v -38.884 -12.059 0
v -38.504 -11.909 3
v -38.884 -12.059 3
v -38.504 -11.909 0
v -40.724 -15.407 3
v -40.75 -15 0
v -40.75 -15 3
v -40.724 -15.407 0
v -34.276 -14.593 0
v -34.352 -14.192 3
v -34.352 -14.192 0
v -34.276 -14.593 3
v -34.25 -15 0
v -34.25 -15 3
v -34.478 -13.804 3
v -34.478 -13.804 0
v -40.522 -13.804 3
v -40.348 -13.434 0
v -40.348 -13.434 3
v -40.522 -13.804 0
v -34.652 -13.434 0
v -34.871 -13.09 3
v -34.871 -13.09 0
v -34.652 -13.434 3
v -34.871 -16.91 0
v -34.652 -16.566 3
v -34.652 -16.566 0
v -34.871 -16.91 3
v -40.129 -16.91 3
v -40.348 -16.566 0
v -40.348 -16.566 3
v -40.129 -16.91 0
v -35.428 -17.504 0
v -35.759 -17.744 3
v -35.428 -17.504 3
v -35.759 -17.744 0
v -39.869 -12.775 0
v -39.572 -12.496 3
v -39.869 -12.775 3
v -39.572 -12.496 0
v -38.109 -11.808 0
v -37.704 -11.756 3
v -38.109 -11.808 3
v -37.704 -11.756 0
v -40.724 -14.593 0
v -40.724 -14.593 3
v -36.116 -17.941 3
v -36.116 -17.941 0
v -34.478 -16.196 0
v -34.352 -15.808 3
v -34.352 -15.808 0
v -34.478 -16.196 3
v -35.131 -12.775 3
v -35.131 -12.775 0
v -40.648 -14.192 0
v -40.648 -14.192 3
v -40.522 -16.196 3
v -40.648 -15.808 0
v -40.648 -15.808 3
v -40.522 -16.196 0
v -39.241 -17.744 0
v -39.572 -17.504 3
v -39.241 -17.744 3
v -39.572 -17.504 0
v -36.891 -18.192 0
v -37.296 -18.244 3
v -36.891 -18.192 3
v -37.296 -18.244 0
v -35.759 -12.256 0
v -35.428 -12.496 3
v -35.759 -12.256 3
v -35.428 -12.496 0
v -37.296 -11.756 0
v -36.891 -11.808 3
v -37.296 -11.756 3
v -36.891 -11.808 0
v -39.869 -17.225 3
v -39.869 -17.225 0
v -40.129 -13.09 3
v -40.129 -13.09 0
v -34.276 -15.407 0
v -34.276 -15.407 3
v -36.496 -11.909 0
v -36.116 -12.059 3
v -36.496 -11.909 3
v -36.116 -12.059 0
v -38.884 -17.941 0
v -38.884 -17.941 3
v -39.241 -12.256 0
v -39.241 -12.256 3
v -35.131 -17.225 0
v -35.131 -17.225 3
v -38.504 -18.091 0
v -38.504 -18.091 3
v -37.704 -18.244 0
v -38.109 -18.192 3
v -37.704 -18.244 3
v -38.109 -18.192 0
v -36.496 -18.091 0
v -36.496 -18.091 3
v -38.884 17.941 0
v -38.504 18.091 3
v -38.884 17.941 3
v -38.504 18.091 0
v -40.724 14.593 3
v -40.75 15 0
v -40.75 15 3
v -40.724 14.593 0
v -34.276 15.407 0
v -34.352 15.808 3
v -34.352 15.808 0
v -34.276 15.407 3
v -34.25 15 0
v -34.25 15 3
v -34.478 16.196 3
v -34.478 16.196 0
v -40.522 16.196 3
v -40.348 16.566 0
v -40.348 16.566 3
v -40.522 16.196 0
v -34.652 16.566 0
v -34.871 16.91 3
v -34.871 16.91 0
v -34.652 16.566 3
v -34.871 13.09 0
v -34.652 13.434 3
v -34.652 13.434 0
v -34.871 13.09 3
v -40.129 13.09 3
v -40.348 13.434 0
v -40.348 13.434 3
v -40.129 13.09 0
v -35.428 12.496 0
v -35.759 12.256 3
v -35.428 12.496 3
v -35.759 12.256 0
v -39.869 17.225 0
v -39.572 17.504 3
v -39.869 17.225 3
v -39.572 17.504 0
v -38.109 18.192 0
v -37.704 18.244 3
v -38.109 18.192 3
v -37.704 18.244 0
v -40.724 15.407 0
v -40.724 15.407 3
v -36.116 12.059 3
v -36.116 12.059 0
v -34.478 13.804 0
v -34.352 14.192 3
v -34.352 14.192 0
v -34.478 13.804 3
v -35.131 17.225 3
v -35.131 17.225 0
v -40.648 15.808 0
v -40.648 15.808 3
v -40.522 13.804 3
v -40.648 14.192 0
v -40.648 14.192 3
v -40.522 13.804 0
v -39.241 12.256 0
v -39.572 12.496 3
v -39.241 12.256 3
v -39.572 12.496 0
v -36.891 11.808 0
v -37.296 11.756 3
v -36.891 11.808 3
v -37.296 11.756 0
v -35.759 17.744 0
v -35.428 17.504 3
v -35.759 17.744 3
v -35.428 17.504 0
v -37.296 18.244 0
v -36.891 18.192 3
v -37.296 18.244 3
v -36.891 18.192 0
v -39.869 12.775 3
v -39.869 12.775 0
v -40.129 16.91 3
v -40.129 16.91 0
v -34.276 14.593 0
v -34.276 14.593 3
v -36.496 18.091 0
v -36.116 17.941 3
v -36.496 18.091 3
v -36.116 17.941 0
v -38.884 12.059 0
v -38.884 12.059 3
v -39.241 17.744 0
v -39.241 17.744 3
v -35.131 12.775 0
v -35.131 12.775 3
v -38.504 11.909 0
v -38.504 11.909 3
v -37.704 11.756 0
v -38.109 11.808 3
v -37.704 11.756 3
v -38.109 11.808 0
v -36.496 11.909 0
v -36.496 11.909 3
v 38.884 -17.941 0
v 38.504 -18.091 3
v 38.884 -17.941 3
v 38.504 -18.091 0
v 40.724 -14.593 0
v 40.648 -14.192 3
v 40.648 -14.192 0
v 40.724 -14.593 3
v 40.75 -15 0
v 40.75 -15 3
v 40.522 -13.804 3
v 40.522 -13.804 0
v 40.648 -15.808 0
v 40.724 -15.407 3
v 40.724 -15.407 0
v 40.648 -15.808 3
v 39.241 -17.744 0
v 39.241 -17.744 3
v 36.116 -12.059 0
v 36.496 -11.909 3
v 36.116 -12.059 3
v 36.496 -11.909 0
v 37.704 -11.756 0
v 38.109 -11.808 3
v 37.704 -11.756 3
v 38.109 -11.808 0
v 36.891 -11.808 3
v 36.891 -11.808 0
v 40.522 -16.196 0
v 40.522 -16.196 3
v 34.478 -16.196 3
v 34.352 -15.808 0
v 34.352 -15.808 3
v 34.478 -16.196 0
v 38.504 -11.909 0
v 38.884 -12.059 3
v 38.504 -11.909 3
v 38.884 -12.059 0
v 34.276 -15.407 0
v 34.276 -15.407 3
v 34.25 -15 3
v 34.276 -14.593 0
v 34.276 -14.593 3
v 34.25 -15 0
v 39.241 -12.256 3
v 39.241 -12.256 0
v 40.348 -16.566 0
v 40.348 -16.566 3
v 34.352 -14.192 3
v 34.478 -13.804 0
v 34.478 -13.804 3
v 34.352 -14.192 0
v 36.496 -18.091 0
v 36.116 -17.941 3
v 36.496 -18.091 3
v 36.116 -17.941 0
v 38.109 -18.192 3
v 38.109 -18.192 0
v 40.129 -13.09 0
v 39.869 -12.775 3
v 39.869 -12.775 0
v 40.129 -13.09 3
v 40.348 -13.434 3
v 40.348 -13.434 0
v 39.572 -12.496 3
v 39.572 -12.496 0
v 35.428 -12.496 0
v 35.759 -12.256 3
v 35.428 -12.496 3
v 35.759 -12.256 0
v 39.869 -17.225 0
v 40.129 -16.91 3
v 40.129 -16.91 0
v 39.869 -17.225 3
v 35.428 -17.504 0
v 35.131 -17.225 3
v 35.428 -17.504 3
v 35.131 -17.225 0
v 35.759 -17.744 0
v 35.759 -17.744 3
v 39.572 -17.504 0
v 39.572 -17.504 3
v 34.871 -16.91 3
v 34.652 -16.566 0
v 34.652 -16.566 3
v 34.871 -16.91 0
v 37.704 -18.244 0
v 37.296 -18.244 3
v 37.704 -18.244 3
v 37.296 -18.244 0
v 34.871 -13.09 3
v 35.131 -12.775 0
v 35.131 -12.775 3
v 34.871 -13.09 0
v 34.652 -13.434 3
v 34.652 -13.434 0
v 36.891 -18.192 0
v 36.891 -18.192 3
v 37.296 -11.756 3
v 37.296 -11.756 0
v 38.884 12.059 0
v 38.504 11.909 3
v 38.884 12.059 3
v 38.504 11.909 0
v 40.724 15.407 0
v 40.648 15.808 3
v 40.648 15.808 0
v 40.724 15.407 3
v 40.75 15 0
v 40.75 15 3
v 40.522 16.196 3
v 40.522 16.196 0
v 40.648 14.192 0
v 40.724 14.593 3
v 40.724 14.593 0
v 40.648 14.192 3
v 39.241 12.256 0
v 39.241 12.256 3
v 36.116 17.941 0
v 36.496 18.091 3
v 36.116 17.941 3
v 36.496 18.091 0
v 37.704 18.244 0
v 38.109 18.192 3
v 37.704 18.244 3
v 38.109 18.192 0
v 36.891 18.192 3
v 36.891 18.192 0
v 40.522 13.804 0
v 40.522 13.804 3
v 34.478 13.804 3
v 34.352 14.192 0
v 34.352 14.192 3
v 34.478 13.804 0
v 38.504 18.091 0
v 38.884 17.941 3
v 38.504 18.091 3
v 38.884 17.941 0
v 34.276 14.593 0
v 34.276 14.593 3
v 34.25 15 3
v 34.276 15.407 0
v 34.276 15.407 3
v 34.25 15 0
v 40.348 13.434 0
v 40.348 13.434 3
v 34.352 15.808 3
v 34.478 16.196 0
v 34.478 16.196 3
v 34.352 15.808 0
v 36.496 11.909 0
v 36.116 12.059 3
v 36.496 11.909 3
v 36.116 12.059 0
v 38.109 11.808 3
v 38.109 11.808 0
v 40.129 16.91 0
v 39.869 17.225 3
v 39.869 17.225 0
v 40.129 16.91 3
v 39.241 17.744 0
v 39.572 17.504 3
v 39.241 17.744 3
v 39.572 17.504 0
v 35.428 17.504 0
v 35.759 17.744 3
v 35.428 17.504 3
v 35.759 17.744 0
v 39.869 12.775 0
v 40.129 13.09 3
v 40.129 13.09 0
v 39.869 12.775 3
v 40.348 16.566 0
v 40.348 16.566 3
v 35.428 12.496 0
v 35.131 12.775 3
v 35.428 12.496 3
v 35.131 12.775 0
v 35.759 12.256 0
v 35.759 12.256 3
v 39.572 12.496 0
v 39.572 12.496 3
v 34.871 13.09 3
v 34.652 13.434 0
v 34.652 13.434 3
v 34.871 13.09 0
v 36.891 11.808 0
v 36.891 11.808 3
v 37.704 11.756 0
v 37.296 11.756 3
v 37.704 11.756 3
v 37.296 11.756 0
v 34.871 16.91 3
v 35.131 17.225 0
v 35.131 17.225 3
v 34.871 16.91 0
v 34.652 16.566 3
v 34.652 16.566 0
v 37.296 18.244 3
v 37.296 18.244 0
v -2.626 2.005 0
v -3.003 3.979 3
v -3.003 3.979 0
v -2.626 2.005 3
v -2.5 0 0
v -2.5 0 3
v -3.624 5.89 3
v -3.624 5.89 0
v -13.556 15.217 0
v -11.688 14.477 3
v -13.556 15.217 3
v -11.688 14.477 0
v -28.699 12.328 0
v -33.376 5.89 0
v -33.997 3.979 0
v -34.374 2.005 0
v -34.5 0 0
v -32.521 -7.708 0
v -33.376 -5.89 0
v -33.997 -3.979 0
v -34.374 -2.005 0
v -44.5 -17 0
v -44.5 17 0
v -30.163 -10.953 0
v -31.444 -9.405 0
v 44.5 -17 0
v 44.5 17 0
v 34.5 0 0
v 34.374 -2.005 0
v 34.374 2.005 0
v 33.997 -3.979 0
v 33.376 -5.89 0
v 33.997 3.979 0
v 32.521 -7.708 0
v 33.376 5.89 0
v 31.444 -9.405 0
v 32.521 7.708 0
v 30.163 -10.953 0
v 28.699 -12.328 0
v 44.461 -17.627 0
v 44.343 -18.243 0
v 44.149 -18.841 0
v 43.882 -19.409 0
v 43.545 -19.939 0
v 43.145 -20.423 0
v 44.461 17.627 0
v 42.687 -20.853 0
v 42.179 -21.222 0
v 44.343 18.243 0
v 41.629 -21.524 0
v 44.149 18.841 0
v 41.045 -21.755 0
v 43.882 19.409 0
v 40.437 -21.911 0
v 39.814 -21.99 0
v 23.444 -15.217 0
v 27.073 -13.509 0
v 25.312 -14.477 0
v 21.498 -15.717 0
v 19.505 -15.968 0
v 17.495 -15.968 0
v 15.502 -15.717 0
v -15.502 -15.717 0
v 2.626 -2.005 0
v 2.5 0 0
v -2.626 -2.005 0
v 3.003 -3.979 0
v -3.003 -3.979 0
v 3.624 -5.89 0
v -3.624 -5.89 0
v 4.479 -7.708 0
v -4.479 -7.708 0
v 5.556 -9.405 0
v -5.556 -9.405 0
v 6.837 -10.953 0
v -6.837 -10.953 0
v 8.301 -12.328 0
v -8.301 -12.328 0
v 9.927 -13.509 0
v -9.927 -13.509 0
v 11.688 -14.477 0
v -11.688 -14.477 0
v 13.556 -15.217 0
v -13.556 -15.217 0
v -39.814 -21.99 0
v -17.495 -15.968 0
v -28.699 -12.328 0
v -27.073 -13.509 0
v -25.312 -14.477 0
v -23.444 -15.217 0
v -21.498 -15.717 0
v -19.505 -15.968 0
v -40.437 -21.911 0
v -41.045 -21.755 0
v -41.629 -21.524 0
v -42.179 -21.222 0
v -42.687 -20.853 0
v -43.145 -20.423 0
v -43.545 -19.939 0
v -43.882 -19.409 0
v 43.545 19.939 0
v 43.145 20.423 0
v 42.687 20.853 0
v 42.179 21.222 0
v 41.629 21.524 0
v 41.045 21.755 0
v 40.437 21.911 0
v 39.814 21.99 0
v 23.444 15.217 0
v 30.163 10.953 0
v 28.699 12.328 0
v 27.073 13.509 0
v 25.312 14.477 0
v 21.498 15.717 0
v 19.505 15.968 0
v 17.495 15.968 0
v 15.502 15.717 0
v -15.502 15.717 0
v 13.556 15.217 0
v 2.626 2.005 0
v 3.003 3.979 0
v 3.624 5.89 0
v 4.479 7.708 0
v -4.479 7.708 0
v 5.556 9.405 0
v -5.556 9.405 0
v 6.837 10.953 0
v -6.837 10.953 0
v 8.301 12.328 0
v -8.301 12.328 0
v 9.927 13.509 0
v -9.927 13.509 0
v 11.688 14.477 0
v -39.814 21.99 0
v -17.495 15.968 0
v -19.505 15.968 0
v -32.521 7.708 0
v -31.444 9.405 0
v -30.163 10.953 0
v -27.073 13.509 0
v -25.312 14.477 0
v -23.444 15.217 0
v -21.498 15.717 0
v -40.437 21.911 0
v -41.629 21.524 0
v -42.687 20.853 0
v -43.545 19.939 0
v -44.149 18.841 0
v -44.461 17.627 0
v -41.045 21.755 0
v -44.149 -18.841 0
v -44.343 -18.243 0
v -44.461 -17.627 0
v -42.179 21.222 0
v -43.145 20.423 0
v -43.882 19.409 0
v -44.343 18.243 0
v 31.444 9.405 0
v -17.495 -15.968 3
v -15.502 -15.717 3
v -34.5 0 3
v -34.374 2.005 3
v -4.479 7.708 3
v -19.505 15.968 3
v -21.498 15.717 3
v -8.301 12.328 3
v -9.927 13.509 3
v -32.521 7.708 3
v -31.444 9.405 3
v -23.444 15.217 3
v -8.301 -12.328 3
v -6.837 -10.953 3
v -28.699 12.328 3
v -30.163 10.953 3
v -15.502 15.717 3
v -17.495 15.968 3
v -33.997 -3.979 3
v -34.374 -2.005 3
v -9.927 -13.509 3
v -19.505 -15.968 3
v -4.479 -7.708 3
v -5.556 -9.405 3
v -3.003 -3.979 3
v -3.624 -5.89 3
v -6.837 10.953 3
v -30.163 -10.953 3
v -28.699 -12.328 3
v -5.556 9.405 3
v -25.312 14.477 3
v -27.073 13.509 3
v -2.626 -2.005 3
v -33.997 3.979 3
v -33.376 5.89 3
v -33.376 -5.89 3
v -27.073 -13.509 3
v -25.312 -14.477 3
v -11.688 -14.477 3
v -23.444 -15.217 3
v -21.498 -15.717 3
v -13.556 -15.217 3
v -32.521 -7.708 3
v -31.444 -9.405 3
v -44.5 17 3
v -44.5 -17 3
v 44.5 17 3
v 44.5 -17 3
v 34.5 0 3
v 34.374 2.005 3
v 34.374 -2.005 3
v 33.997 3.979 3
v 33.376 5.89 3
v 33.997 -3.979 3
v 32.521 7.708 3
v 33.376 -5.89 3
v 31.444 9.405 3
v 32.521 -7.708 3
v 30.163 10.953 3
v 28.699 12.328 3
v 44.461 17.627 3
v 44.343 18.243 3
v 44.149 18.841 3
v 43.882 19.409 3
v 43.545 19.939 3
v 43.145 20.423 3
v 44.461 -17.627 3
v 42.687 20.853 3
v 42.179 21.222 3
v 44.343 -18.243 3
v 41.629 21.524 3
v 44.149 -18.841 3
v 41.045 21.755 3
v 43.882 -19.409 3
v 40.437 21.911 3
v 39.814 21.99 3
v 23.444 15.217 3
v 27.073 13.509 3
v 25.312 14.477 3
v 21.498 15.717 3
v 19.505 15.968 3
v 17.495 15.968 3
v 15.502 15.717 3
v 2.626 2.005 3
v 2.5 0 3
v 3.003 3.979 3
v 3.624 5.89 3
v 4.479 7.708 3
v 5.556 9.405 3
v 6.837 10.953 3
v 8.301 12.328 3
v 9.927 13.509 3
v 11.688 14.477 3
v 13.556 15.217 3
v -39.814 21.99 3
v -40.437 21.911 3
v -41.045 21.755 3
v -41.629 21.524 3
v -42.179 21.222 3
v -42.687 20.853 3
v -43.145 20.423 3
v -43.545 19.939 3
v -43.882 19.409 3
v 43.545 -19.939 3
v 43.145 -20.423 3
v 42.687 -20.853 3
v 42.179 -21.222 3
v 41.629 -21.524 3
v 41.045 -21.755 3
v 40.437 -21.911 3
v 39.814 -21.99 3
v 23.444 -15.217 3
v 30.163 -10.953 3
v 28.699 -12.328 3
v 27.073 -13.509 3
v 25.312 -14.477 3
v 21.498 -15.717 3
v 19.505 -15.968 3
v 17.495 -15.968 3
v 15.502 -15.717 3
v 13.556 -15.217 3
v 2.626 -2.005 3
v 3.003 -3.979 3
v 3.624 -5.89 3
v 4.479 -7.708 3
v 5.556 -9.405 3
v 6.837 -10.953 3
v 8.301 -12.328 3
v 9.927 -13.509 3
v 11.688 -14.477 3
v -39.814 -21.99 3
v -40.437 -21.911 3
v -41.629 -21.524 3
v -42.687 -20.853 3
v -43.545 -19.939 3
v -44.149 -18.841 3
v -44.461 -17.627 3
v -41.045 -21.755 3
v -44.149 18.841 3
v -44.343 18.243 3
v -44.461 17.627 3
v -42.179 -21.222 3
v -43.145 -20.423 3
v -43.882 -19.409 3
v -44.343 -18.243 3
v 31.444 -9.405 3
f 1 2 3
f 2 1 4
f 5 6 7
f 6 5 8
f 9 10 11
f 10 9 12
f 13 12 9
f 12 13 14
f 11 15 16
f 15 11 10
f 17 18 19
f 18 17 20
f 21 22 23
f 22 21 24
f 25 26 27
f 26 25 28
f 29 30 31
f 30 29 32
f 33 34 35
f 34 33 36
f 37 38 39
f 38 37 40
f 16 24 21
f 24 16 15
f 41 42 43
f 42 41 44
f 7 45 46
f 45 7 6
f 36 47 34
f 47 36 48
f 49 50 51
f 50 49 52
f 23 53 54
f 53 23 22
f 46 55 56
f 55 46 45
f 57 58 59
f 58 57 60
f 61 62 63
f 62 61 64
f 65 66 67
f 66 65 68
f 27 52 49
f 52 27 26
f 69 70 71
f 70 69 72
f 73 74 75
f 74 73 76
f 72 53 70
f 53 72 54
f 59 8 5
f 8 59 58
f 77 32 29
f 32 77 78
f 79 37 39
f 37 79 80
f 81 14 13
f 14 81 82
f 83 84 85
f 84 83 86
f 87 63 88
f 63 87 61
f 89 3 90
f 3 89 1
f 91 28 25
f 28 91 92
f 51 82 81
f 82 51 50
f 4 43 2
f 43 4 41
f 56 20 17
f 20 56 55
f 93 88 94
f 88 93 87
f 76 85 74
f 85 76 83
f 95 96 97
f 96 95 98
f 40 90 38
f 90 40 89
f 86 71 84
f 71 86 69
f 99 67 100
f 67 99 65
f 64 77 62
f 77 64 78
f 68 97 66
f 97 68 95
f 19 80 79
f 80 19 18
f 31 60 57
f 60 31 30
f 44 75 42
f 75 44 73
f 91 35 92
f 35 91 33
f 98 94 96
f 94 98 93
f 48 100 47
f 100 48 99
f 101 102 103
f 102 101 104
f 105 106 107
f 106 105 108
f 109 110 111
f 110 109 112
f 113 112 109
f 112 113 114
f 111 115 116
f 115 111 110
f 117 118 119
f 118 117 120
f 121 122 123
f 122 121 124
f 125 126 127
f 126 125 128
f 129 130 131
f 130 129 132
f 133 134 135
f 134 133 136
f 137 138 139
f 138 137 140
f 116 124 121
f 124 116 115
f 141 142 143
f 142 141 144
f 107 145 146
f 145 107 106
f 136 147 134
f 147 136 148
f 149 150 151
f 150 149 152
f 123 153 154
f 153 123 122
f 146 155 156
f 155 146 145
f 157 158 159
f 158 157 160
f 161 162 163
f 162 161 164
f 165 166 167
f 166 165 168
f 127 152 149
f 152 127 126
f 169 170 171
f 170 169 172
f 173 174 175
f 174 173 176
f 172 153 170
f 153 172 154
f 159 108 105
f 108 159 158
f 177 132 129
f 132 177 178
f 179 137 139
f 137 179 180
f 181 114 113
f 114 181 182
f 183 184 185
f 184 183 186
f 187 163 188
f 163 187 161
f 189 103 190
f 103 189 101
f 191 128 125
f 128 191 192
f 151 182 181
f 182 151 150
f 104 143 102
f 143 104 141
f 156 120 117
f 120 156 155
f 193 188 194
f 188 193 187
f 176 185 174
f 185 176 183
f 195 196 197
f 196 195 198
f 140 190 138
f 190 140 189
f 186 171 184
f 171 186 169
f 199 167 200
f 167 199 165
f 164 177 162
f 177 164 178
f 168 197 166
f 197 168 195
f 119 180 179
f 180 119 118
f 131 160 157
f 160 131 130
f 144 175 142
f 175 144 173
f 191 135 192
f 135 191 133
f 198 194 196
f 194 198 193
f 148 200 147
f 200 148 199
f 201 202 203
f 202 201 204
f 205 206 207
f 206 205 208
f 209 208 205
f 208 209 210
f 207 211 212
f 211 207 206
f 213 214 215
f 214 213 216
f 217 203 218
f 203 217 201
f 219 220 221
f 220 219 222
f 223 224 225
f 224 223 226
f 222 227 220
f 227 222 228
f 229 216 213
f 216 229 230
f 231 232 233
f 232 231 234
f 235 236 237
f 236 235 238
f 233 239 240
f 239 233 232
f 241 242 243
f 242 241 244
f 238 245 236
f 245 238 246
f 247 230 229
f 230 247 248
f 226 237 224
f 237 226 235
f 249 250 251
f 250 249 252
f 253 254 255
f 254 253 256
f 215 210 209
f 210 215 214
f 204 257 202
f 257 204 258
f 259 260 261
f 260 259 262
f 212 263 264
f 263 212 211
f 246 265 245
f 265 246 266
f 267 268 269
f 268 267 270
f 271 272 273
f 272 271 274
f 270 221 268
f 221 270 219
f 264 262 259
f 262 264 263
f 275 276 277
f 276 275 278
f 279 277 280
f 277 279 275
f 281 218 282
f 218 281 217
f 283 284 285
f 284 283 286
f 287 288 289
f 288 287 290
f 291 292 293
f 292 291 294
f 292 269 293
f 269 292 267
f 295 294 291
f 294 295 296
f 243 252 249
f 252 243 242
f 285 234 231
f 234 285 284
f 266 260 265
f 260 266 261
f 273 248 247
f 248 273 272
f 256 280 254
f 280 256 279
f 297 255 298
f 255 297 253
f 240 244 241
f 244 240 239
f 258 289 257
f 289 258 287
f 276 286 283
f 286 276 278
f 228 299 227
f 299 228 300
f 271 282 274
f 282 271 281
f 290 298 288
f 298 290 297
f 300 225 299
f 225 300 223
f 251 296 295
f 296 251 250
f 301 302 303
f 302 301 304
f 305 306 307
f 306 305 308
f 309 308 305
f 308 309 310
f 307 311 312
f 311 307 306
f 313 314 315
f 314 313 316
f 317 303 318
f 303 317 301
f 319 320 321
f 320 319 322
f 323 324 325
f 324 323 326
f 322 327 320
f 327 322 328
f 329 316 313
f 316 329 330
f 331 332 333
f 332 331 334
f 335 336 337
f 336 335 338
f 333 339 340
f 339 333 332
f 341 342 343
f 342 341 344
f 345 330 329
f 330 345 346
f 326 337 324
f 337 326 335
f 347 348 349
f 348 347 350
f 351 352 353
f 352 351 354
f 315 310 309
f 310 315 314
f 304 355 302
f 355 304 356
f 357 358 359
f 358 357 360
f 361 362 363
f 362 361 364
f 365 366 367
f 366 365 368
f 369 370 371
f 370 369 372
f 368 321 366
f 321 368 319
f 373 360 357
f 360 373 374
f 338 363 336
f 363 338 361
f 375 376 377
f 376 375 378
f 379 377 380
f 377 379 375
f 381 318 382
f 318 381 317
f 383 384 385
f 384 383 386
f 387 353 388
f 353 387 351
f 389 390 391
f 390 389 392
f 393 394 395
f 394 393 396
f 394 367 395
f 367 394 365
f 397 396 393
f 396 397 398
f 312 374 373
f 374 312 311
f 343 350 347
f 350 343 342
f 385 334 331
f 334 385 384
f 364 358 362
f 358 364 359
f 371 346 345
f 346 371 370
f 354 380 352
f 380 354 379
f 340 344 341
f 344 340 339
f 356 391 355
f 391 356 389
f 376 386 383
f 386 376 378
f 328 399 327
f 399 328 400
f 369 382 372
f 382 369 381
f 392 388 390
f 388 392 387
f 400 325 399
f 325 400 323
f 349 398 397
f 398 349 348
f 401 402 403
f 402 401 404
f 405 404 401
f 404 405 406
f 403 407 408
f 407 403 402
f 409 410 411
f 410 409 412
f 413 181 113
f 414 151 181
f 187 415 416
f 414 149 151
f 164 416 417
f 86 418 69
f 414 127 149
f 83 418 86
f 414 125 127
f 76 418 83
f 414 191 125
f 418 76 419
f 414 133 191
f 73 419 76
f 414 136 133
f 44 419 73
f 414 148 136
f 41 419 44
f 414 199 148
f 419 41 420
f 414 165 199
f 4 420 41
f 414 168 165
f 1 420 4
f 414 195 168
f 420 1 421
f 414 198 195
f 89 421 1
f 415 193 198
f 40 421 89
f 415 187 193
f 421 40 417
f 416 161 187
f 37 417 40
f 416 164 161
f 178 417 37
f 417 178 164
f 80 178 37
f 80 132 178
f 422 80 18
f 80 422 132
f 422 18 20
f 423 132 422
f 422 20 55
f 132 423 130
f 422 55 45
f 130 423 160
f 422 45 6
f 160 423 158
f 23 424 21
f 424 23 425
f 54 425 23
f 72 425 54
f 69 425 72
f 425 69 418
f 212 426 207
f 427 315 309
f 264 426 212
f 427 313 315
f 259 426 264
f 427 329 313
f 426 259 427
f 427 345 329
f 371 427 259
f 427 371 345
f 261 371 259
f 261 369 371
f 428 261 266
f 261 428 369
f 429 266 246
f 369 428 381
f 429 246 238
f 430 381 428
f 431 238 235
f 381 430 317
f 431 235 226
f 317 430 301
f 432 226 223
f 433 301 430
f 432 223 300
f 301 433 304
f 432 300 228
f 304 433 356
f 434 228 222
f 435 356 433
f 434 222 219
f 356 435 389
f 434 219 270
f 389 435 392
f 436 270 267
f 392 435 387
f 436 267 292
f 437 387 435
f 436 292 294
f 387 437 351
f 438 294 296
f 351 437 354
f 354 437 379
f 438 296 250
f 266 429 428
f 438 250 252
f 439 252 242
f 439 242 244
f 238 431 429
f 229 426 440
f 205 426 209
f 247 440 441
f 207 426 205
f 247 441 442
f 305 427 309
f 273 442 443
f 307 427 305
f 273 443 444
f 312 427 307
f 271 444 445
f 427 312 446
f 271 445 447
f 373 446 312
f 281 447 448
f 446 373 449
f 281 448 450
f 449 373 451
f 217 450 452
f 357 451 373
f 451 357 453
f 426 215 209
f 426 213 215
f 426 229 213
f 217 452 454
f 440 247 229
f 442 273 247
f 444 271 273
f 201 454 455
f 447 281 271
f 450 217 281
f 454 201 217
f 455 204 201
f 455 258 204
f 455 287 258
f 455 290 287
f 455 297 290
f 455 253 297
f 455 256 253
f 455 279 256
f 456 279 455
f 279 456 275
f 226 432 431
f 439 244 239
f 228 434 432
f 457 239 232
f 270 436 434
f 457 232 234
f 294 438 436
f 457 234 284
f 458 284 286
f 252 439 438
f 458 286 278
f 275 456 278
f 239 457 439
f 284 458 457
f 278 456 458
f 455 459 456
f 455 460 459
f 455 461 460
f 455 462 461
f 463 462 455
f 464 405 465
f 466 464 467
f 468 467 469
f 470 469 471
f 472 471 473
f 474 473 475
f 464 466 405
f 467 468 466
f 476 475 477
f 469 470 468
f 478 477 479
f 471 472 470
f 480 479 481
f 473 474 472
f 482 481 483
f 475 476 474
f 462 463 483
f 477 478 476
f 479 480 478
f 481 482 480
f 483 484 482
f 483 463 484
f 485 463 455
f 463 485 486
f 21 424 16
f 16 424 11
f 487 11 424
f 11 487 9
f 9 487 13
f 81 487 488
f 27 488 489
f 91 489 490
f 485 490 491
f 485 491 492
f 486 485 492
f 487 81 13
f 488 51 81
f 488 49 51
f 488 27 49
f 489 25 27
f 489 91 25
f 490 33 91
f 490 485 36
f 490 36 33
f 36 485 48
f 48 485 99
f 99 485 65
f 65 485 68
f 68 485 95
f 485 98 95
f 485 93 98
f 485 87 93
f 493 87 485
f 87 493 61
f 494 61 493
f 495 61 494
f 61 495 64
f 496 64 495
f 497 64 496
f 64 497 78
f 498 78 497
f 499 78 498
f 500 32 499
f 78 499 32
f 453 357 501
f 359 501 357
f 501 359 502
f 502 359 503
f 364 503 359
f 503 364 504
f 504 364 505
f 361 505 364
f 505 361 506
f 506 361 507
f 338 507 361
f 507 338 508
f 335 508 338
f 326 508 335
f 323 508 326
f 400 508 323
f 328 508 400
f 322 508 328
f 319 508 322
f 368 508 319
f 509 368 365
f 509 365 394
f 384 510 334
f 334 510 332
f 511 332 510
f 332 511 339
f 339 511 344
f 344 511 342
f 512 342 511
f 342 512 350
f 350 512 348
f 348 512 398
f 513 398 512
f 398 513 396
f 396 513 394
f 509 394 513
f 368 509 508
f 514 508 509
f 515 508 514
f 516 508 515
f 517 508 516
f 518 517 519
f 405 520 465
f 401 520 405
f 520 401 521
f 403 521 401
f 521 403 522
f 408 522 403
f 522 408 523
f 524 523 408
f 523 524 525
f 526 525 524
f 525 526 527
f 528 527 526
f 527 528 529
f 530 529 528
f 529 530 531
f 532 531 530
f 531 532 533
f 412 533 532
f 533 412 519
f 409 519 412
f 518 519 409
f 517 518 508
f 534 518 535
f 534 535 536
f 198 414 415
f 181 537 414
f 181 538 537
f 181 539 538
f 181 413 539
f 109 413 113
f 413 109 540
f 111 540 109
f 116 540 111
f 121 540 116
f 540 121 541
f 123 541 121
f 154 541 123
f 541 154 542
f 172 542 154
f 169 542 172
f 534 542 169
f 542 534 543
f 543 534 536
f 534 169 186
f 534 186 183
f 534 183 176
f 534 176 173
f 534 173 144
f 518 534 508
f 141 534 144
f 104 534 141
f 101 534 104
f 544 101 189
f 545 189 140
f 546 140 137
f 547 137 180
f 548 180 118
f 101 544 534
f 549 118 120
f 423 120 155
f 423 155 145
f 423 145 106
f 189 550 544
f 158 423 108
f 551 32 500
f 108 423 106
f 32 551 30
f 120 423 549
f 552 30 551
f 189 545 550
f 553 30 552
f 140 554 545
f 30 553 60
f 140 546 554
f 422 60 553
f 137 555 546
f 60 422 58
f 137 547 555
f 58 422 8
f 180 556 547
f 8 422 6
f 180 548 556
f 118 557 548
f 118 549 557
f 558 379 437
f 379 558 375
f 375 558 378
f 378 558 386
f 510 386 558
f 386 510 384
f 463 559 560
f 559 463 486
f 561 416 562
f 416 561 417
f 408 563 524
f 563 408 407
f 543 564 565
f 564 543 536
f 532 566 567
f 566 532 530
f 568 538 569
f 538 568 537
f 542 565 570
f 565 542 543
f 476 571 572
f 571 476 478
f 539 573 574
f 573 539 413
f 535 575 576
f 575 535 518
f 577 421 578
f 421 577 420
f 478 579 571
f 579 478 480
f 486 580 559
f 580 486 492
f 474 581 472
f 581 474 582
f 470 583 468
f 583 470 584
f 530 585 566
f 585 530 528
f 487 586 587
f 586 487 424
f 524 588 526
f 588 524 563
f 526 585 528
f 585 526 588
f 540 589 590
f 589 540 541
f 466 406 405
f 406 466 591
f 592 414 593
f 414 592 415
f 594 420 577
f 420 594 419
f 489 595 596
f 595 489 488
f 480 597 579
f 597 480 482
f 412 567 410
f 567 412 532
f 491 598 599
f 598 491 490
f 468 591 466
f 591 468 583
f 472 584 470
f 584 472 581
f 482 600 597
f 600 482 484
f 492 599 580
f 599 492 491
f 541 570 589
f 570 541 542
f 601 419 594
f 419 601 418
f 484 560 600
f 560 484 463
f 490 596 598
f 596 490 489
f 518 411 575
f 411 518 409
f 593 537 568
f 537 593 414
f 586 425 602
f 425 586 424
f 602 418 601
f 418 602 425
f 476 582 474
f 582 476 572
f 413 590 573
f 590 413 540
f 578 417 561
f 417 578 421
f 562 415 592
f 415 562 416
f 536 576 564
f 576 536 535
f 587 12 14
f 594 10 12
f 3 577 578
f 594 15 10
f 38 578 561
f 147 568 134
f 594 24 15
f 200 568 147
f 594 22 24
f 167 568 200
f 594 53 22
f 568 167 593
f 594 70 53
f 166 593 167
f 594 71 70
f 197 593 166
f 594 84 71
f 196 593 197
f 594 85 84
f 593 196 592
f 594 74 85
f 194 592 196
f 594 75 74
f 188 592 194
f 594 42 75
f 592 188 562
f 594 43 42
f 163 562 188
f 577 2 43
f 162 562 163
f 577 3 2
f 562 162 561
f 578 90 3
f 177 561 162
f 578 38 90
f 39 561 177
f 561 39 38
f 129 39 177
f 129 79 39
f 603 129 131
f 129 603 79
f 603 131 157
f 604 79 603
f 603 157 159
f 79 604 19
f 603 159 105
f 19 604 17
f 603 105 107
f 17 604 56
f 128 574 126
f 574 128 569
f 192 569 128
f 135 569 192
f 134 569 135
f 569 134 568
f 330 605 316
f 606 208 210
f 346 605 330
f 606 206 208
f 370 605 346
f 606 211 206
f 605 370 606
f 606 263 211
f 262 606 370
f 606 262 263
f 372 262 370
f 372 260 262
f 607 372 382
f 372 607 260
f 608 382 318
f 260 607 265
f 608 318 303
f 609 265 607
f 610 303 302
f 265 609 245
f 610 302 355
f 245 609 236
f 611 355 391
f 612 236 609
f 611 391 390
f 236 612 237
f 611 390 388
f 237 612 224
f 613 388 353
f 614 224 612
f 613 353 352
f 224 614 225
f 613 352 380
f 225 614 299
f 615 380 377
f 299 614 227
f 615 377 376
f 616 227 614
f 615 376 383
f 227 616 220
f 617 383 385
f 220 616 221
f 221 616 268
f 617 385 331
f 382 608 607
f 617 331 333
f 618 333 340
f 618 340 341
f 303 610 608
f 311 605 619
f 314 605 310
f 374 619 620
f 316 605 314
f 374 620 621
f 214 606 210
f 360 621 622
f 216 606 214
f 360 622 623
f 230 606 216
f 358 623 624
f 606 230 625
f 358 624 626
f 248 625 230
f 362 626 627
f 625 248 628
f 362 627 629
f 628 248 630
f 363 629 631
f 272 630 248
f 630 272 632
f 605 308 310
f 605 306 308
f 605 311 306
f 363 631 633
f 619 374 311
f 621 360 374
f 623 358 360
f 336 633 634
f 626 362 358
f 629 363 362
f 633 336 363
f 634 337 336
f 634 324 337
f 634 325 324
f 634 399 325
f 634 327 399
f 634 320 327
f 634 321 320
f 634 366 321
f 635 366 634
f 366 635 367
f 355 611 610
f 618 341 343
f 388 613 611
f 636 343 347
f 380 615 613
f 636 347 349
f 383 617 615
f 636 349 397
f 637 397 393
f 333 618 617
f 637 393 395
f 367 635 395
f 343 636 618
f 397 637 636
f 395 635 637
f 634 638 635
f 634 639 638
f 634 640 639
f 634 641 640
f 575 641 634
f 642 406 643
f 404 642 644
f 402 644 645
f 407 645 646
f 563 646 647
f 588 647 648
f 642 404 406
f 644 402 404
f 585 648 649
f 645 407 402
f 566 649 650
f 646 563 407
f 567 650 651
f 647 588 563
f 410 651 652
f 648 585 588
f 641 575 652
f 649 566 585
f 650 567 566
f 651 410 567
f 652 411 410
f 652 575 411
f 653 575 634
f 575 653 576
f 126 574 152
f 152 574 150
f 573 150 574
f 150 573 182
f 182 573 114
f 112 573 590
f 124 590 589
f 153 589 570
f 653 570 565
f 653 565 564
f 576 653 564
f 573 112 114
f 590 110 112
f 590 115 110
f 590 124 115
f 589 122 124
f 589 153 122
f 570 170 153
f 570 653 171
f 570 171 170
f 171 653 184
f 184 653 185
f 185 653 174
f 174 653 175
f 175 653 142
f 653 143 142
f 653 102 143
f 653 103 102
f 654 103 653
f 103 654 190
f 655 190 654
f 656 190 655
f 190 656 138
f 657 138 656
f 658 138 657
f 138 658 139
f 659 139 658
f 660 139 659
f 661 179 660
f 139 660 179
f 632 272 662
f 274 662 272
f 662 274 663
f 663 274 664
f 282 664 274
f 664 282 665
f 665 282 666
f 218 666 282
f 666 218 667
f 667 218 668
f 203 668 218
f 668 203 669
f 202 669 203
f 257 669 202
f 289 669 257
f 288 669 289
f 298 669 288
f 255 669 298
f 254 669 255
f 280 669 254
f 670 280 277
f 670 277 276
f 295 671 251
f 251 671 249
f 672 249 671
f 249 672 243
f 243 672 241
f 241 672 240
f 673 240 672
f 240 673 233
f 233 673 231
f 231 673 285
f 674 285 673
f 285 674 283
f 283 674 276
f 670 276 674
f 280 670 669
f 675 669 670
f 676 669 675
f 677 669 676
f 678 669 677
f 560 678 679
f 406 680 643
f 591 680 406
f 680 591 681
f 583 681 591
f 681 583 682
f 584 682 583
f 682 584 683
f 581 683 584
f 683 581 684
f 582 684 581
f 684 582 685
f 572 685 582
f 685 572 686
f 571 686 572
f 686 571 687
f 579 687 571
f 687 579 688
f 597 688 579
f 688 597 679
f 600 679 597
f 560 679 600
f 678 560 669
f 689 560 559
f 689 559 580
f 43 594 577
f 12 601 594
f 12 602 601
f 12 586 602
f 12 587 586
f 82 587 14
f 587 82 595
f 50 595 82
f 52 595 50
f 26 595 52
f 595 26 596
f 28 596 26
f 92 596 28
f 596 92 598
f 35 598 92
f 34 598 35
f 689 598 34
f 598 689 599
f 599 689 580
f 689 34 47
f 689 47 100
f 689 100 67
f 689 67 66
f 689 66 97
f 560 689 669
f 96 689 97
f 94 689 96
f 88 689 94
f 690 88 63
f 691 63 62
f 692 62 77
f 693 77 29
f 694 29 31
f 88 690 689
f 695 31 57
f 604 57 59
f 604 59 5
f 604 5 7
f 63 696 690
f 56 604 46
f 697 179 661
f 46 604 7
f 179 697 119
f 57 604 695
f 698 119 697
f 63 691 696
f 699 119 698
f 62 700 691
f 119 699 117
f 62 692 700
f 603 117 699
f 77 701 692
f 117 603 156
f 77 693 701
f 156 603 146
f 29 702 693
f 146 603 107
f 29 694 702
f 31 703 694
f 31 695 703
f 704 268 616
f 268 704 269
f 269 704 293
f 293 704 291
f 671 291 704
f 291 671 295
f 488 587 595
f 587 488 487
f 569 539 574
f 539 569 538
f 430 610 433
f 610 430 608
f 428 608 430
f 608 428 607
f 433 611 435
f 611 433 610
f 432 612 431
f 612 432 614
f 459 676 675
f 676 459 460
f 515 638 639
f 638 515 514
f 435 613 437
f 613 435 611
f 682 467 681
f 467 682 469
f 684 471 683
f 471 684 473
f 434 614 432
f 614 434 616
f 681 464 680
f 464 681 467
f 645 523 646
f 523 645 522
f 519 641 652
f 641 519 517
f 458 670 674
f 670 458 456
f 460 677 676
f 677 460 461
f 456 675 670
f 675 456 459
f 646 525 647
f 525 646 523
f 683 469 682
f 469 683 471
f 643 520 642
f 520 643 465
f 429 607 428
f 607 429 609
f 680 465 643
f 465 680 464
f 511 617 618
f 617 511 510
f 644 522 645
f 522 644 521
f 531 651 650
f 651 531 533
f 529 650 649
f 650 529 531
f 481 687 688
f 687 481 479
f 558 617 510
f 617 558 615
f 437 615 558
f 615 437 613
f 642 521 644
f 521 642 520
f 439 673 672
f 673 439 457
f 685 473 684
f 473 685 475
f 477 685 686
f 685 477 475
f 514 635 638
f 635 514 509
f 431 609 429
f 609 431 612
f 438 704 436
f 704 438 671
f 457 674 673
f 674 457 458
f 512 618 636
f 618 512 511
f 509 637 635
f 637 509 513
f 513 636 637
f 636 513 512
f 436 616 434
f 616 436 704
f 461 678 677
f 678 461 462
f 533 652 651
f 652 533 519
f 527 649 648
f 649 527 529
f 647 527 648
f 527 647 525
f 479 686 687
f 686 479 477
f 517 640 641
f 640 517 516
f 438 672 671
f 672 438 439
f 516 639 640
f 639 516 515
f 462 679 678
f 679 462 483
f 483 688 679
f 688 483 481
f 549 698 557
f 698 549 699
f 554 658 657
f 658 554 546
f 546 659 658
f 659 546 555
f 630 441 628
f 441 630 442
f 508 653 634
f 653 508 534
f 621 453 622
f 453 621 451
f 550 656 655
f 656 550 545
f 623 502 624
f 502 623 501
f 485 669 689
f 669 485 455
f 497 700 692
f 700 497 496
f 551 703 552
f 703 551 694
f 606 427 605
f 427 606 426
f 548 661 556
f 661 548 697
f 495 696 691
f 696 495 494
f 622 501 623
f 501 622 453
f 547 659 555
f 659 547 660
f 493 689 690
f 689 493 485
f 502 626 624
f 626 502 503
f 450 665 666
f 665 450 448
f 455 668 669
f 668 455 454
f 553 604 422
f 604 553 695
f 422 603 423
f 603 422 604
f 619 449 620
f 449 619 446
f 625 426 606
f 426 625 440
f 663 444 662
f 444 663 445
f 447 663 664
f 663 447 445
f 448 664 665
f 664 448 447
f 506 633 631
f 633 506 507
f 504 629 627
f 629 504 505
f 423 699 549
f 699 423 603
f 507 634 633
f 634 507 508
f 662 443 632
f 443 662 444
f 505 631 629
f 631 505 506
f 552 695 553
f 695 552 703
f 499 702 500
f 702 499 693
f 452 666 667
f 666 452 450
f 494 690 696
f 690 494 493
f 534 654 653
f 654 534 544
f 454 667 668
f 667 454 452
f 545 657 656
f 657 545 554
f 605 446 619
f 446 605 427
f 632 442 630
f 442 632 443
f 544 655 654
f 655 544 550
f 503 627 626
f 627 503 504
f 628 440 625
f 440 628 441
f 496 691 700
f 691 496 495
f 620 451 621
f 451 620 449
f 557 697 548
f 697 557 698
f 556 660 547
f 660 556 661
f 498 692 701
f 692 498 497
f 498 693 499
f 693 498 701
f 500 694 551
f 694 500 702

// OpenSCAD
$fn = 50;


difference() {
	union() {
		hull() {
			translate(v = [-39.5000000000, 17.0000000000, 0]) {
				cylinder(h = 3, r = 5);
			}
			translate(v = [39.5000000000, 17.0000000000, 0]) {
				cylinder(h = 3, r = 5);
			}
			translate(v = [-39.5000000000, -17.0000000000, 0]) {
				cylinder(h = 3, r = 5);
			}
			translate(v = [39.5000000000, -17.0000000000, 0]) {
				cylinder(h = 3, r = 5);
			}
		}
	}
	union() {
		#translate(v = [-37.5000000000, -15.0000000000, -100.0000000000]) {
			cylinder(h = 200, r = 3.2500000000);
		}
		#translate(v = [-37.5000000000, 15.0000000000, -100.0000000000]) {
			cylinder(h = 200, r = 3.2500000000);
		}
		#translate(v = [37.5000000000, -15.0000000000, -100.0000000000]) {
			cylinder(h = 200, r = 3.2500000000);
		}
		#translate(v = [37.5000000000, 15.0000000000, -100.0000000000]) {
			cylinder(h = 200, r = 3.2500000000);
		}
		#translate(v = [-18.5000000000, 0, 0]) {
			cylinder(h = 3, r = 16.0000000000);
		}
		#translate(v = [18.5000000000, 0, 0]) {
			cylinder(h = 3, r = 16.0000000000);
		}
	}
}
